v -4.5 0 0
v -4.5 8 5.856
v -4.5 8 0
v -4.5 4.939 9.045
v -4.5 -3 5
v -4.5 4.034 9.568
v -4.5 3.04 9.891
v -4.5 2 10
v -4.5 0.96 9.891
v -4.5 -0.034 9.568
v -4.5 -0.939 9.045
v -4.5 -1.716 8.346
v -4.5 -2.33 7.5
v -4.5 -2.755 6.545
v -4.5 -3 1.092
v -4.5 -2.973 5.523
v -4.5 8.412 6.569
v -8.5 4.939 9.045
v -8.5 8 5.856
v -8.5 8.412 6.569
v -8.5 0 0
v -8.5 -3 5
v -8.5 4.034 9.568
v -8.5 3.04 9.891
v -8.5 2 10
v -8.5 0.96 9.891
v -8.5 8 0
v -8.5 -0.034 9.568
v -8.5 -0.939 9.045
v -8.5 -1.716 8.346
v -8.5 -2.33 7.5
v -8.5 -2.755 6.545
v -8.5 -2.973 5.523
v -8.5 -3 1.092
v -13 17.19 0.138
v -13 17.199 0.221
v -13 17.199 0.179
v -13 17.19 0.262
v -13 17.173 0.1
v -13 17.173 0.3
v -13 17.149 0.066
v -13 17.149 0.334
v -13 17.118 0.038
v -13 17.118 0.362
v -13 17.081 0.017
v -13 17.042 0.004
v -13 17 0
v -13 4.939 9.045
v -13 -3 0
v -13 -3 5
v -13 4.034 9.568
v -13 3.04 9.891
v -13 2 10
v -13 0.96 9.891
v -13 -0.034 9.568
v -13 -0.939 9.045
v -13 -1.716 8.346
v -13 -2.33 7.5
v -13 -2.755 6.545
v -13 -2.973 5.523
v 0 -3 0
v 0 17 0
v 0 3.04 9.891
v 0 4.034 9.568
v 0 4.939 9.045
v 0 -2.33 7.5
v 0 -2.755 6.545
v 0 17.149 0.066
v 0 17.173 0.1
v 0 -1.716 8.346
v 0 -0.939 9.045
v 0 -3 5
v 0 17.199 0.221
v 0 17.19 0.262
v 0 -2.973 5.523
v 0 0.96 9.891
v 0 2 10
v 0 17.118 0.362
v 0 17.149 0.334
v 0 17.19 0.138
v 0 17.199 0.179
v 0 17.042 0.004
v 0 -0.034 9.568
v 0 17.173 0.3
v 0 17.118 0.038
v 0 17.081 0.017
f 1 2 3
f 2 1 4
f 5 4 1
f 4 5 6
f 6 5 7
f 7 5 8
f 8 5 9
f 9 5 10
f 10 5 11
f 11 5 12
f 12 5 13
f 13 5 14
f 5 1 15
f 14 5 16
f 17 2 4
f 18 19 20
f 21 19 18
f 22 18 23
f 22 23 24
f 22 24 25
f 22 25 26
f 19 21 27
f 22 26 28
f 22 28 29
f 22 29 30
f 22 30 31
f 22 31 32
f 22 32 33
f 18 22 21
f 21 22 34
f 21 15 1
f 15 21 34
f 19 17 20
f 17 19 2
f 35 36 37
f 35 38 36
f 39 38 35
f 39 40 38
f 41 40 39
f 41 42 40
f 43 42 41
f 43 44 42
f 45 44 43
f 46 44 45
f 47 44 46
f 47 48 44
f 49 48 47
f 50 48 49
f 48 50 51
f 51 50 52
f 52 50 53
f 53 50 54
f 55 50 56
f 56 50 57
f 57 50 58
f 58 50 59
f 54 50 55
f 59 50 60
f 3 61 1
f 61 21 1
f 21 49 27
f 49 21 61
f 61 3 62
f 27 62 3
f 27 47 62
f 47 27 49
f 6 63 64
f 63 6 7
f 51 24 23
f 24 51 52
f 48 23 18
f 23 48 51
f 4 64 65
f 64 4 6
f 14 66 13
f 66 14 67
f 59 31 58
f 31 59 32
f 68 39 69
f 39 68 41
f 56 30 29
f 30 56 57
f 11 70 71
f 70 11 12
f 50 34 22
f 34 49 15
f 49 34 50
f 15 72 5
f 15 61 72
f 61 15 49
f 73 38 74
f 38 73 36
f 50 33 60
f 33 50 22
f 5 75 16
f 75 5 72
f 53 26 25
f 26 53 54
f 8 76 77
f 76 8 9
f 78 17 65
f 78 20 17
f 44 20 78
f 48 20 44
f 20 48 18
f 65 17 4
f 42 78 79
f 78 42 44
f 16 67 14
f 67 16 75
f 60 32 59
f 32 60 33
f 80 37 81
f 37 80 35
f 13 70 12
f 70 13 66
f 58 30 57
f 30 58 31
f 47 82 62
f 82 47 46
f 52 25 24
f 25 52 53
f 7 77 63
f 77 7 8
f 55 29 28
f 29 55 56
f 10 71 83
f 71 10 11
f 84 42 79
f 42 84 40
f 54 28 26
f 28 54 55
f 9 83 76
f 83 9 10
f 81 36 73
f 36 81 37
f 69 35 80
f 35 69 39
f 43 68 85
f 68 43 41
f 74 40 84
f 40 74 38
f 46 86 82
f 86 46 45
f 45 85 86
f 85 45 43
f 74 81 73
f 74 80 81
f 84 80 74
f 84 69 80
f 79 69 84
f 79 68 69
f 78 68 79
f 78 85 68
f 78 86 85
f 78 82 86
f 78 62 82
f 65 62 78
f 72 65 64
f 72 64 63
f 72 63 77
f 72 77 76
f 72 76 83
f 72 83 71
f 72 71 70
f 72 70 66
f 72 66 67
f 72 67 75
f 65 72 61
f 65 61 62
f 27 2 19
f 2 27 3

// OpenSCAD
$fn=30;

rotate([0,-90,0])difference(){
	translate([0,2,0])hull(){
		translate([0,-5,0])cube([5,5,13]);
		translate([5,0,0])cylinder(r=5,h=13);
		translate([0.2,15,0])cylinder(r=0.2,h=13);
	}

	for ( i = [-70 : 10 : 30] )
	{
		rotate([0,90,i]) translate([-13/2-2,0,-6]) #cube([4,4,20]);
	}
	rotate([0,90,0]) translate([-13/2-2,4,-6]) #cube([4,4,200]);
}
